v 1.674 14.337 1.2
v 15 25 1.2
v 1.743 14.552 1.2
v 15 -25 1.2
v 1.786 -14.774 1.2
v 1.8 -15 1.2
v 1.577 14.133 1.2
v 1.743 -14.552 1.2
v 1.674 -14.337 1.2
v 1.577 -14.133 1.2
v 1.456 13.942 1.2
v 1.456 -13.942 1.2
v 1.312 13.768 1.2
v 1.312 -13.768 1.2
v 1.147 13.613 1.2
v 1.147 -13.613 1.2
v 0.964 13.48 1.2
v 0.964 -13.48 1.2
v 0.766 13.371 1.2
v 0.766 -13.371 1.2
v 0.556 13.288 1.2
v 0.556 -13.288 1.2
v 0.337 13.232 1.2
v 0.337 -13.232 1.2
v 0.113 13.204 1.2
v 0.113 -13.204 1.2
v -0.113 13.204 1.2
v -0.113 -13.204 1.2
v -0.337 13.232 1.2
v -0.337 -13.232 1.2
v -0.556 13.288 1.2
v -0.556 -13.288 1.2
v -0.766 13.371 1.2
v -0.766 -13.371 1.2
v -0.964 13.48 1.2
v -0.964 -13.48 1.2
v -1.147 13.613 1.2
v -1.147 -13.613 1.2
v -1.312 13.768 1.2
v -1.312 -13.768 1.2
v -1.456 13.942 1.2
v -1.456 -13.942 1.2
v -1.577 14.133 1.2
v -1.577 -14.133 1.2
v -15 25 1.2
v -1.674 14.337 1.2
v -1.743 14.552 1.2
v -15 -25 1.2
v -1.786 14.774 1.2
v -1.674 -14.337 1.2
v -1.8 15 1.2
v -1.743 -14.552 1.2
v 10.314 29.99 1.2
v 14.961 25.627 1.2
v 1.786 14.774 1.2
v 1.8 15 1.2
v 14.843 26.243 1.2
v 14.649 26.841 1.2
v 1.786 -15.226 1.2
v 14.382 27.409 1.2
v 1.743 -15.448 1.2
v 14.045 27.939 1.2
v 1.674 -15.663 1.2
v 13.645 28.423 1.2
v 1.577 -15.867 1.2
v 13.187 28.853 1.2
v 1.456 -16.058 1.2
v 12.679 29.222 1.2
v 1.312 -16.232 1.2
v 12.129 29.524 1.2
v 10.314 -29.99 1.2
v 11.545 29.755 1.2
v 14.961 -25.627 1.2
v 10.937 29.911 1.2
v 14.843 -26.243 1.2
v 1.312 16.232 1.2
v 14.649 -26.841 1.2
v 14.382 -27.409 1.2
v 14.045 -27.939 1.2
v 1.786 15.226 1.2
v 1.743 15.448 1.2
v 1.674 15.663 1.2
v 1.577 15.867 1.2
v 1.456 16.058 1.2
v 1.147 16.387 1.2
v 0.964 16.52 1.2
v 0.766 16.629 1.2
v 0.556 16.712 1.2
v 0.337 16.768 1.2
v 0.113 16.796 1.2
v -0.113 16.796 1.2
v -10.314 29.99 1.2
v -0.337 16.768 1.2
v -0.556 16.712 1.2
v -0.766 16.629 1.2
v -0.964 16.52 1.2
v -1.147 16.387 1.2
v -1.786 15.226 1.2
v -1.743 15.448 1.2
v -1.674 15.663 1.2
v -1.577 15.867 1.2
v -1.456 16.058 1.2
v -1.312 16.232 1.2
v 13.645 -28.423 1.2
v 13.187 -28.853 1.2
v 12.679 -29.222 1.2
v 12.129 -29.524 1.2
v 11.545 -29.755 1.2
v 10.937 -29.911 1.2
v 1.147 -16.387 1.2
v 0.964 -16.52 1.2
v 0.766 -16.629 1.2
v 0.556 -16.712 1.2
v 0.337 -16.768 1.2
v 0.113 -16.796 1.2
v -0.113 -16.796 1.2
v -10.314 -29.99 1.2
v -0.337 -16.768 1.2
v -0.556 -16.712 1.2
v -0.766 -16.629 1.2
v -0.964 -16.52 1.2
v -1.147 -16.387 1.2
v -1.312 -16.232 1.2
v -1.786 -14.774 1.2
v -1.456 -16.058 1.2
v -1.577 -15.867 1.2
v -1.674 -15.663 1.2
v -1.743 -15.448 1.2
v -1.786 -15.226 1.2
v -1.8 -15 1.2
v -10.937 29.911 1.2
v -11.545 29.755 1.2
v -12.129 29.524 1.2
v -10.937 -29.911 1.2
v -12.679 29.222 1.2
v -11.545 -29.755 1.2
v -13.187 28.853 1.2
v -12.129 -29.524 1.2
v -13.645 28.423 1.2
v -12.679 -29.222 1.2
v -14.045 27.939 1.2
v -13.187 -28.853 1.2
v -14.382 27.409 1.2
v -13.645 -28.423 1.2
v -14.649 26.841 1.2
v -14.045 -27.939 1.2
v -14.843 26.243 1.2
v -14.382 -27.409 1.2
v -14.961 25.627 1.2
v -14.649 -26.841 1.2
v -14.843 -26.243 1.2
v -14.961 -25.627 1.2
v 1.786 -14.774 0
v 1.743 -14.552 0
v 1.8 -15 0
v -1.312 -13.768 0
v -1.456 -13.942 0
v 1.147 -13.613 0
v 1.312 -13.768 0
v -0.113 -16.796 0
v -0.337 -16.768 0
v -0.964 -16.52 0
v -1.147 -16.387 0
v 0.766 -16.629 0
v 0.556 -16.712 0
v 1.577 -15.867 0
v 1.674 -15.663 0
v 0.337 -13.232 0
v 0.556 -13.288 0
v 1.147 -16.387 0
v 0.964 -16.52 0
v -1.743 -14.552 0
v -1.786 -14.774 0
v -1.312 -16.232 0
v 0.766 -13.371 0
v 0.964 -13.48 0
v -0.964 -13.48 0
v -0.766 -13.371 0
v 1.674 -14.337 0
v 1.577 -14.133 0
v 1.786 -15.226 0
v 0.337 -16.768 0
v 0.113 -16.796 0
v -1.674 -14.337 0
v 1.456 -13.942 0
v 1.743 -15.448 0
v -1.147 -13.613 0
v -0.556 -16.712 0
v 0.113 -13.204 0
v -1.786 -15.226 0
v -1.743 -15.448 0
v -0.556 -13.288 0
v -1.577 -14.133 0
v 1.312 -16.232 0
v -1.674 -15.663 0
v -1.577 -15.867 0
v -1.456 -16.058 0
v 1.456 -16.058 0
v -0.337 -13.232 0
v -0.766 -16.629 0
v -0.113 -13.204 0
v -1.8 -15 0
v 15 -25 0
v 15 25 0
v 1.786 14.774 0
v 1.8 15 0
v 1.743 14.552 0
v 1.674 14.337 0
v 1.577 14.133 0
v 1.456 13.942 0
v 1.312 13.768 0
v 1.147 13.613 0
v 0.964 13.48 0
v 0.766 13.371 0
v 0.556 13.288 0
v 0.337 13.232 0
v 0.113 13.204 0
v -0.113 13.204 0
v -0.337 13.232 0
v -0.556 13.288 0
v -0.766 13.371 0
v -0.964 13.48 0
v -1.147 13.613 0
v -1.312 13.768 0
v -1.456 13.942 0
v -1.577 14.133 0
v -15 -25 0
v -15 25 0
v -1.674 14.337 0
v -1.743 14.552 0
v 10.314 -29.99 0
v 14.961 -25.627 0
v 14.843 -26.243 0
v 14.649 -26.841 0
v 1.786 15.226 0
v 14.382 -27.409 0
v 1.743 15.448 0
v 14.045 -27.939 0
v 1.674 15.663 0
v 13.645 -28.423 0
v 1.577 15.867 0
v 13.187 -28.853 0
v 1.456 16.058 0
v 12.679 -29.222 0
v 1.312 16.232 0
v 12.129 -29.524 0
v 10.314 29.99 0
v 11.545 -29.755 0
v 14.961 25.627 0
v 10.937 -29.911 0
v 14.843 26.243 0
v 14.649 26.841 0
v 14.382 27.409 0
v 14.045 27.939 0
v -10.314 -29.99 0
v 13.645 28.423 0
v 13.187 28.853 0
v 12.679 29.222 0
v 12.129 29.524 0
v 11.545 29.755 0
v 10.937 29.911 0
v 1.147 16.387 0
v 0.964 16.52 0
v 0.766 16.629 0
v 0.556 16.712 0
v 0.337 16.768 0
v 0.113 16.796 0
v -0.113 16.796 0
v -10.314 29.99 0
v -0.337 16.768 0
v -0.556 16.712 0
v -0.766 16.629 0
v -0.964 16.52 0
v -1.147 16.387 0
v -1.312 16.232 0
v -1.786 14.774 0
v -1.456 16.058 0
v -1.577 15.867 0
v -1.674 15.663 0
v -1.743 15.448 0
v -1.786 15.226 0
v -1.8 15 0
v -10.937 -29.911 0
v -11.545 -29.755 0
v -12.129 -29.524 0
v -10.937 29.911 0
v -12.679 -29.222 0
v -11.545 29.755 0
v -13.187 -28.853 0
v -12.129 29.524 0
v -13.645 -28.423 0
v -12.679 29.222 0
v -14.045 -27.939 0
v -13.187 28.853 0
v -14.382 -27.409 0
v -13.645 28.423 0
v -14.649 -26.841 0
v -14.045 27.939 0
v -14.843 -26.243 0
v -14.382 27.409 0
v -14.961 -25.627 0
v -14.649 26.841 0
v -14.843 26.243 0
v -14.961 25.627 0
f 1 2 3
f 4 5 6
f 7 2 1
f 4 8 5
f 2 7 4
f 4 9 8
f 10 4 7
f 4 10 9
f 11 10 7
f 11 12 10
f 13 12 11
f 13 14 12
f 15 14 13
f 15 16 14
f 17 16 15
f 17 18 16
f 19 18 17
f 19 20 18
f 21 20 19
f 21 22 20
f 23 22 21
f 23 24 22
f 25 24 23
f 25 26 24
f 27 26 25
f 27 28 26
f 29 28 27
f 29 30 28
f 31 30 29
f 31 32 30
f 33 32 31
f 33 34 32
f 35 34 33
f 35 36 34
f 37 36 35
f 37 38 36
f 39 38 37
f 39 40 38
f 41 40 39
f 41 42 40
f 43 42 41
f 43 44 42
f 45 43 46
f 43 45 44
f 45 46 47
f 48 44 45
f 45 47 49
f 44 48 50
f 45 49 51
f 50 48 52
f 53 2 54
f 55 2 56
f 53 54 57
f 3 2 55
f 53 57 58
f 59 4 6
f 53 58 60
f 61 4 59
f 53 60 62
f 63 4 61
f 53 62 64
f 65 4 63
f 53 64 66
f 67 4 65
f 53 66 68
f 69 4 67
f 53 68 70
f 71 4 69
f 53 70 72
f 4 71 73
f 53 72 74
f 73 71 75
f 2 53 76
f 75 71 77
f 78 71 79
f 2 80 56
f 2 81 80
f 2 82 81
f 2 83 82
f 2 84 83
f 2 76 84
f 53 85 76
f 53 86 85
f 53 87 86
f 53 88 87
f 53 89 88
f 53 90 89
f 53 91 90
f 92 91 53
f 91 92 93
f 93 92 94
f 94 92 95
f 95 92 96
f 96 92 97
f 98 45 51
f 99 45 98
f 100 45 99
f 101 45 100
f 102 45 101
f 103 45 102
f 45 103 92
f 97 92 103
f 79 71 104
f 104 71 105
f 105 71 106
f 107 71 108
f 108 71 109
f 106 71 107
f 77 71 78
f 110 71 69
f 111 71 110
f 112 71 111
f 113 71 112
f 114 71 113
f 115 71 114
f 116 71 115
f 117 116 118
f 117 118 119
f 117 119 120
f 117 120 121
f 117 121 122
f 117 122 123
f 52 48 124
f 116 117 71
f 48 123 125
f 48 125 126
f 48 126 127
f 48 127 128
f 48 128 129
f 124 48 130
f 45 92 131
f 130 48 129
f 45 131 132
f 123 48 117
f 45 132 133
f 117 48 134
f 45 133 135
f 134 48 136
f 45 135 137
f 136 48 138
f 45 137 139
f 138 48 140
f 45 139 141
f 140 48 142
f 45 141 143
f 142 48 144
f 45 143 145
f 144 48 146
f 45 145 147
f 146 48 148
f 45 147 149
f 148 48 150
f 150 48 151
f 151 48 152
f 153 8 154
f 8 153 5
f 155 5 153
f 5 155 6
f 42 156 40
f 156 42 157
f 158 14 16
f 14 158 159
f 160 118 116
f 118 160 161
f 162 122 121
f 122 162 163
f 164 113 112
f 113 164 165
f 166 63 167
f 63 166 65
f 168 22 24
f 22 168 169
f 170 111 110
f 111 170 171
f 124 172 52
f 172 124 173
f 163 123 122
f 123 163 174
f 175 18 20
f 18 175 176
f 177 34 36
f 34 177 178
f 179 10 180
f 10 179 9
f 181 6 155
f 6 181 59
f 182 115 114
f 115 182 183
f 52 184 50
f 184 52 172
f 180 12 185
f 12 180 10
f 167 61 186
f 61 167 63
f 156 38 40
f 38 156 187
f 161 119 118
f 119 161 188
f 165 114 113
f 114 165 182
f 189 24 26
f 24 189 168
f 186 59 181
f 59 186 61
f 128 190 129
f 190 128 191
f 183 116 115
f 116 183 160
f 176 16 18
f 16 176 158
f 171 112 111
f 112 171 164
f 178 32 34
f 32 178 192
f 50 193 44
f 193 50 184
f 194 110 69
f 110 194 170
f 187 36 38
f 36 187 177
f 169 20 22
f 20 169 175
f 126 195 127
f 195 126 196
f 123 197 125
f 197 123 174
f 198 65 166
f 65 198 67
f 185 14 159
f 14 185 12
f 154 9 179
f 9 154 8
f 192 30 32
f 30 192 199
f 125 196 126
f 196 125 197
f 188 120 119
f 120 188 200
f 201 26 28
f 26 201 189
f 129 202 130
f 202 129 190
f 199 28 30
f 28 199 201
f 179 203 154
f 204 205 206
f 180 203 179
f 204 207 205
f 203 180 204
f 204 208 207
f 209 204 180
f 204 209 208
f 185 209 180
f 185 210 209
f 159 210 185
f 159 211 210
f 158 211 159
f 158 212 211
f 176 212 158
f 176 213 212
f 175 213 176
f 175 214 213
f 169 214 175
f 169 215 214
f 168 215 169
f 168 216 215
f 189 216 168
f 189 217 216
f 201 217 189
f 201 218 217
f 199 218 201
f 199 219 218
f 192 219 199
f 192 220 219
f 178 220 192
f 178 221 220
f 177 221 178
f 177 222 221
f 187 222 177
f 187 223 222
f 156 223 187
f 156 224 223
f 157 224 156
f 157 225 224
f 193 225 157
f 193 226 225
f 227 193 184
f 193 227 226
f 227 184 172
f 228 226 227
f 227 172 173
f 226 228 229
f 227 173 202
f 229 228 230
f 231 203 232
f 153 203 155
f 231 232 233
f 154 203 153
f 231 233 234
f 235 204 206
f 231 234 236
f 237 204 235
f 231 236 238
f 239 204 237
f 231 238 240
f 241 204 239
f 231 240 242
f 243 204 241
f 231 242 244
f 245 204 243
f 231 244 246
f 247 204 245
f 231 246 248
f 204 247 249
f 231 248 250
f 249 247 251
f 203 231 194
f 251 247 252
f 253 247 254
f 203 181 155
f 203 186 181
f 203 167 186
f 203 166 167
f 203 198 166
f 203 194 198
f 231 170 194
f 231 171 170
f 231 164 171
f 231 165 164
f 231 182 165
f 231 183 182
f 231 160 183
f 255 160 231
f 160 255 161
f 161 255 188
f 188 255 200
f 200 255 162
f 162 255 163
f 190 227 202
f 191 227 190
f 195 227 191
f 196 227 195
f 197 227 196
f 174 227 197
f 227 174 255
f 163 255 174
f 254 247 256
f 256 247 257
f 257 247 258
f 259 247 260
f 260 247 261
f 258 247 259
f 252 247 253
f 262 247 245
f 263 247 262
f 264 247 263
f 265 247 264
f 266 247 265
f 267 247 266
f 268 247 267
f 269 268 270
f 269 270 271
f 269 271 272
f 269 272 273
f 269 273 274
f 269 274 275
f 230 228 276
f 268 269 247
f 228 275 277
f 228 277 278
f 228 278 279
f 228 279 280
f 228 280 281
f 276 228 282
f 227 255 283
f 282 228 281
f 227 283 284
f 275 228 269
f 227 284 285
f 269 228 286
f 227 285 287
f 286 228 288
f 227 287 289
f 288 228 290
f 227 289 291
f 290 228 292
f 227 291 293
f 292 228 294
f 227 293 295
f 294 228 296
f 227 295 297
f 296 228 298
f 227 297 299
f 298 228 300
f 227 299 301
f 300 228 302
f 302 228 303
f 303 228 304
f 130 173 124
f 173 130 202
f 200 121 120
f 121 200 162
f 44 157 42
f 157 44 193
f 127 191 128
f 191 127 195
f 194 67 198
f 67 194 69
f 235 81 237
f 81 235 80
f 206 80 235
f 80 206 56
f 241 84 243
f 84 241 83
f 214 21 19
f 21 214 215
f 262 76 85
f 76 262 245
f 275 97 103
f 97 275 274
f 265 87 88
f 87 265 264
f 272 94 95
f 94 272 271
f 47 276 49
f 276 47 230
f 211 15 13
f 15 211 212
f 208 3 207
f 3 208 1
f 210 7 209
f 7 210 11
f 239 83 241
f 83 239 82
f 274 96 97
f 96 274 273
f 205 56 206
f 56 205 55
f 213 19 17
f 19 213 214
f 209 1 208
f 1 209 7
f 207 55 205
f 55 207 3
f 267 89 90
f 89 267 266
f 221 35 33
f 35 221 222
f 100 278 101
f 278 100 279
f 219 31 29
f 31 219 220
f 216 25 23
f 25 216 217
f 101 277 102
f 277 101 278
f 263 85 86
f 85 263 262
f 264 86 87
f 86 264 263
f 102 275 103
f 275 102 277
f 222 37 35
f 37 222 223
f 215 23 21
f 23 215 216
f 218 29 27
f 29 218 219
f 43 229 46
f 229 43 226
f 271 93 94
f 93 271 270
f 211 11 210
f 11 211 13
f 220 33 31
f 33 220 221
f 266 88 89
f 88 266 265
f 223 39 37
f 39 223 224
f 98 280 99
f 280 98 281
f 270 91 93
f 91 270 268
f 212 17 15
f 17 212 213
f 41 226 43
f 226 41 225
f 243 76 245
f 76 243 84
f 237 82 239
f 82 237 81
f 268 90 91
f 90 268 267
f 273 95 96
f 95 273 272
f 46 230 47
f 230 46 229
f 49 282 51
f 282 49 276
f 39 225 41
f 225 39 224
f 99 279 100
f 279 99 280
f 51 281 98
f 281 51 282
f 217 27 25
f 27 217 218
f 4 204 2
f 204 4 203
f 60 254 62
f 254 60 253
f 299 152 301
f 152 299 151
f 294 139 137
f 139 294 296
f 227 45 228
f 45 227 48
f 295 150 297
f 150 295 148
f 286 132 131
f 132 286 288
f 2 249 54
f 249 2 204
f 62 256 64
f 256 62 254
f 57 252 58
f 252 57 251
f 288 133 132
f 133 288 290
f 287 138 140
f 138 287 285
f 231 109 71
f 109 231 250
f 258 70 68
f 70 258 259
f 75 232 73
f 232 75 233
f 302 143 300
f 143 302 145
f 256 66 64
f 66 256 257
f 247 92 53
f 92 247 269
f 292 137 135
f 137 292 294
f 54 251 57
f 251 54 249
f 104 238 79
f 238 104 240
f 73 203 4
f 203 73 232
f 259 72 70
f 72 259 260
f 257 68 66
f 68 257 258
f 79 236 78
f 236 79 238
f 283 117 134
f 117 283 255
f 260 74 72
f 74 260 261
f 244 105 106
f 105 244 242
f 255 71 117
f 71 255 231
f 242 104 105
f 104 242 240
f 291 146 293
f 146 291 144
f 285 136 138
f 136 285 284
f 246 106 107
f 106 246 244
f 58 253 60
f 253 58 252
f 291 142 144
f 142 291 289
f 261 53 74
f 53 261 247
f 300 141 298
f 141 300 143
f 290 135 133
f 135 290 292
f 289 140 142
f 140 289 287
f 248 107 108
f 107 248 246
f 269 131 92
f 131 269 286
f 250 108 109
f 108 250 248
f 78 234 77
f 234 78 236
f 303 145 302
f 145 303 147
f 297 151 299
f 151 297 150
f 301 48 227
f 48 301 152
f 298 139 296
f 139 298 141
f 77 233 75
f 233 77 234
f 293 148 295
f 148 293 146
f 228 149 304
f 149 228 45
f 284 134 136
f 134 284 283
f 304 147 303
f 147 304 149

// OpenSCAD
$fn = 50;


difference() {
	union() {
		hull() {
			translate(v = [-10.0000000000, 25.0000000000, 0]) {
				cylinder(h = 12, r = 5);
			}
			translate(v = [10.0000000000, 25.0000000000, 0]) {
				cylinder(h = 12, r = 5);
			}
			translate(v = [-10.0000000000, -25.0000000000, 0]) {
				cylinder(h = 12, r = 5);
			}
			translate(v = [10.0000000000, -25.0000000000, 0]) {
				cylinder(h = 12, r = 5);
			}
		}
	}
	union() {
		translate(v = [0, 0, 1.2000000000]) {
			hull() {
				translate(v = [-10.0000000000, 25.0000000000, 0]) {
					cylinder(h = 10.8000000000, r = 3.8000000000);
				}
				translate(v = [10.0000000000, 25.0000000000, 0]) {
					cylinder(h = 10.8000000000, r = 3.8000000000);
				}
				translate(v = [-10.0000000000, -25.0000000000, 0]) {
					cylinder(h = 10.8000000000, r = 3.8000000000);
				}
				translate(v = [10.0000000000, -25.0000000000, 0]) {
					cylinder(h = 10.8000000000, r = 3.8000000000);
				}
			}
		}
		#translate(v = [0.0000000000, -15.0000000000, 0]) {
			cylinder(h = 1.2000000000, r = 1.8000000000);
		}
		#translate(v = [0.0000000000, 15.0000000000, 0]) {
			cylinder(h = 1.2000000000, r = 1.8000000000);
		}
		translate(v = [-250.0000000000, -250.0000000000, 1.2000000000]) {
			cube(size = [500, 500, 500]);
		}
		translate(v = [-250.0000000000, -250.0000000000, 1.2000000000]) {
			cube(size = [500, 500, 500]);
		}
		translate(v = [-250.0000000000, -250.0000000000, 1.2000000000]) {
			cube(size = [500, 500, 500]);
		}
	}
}
